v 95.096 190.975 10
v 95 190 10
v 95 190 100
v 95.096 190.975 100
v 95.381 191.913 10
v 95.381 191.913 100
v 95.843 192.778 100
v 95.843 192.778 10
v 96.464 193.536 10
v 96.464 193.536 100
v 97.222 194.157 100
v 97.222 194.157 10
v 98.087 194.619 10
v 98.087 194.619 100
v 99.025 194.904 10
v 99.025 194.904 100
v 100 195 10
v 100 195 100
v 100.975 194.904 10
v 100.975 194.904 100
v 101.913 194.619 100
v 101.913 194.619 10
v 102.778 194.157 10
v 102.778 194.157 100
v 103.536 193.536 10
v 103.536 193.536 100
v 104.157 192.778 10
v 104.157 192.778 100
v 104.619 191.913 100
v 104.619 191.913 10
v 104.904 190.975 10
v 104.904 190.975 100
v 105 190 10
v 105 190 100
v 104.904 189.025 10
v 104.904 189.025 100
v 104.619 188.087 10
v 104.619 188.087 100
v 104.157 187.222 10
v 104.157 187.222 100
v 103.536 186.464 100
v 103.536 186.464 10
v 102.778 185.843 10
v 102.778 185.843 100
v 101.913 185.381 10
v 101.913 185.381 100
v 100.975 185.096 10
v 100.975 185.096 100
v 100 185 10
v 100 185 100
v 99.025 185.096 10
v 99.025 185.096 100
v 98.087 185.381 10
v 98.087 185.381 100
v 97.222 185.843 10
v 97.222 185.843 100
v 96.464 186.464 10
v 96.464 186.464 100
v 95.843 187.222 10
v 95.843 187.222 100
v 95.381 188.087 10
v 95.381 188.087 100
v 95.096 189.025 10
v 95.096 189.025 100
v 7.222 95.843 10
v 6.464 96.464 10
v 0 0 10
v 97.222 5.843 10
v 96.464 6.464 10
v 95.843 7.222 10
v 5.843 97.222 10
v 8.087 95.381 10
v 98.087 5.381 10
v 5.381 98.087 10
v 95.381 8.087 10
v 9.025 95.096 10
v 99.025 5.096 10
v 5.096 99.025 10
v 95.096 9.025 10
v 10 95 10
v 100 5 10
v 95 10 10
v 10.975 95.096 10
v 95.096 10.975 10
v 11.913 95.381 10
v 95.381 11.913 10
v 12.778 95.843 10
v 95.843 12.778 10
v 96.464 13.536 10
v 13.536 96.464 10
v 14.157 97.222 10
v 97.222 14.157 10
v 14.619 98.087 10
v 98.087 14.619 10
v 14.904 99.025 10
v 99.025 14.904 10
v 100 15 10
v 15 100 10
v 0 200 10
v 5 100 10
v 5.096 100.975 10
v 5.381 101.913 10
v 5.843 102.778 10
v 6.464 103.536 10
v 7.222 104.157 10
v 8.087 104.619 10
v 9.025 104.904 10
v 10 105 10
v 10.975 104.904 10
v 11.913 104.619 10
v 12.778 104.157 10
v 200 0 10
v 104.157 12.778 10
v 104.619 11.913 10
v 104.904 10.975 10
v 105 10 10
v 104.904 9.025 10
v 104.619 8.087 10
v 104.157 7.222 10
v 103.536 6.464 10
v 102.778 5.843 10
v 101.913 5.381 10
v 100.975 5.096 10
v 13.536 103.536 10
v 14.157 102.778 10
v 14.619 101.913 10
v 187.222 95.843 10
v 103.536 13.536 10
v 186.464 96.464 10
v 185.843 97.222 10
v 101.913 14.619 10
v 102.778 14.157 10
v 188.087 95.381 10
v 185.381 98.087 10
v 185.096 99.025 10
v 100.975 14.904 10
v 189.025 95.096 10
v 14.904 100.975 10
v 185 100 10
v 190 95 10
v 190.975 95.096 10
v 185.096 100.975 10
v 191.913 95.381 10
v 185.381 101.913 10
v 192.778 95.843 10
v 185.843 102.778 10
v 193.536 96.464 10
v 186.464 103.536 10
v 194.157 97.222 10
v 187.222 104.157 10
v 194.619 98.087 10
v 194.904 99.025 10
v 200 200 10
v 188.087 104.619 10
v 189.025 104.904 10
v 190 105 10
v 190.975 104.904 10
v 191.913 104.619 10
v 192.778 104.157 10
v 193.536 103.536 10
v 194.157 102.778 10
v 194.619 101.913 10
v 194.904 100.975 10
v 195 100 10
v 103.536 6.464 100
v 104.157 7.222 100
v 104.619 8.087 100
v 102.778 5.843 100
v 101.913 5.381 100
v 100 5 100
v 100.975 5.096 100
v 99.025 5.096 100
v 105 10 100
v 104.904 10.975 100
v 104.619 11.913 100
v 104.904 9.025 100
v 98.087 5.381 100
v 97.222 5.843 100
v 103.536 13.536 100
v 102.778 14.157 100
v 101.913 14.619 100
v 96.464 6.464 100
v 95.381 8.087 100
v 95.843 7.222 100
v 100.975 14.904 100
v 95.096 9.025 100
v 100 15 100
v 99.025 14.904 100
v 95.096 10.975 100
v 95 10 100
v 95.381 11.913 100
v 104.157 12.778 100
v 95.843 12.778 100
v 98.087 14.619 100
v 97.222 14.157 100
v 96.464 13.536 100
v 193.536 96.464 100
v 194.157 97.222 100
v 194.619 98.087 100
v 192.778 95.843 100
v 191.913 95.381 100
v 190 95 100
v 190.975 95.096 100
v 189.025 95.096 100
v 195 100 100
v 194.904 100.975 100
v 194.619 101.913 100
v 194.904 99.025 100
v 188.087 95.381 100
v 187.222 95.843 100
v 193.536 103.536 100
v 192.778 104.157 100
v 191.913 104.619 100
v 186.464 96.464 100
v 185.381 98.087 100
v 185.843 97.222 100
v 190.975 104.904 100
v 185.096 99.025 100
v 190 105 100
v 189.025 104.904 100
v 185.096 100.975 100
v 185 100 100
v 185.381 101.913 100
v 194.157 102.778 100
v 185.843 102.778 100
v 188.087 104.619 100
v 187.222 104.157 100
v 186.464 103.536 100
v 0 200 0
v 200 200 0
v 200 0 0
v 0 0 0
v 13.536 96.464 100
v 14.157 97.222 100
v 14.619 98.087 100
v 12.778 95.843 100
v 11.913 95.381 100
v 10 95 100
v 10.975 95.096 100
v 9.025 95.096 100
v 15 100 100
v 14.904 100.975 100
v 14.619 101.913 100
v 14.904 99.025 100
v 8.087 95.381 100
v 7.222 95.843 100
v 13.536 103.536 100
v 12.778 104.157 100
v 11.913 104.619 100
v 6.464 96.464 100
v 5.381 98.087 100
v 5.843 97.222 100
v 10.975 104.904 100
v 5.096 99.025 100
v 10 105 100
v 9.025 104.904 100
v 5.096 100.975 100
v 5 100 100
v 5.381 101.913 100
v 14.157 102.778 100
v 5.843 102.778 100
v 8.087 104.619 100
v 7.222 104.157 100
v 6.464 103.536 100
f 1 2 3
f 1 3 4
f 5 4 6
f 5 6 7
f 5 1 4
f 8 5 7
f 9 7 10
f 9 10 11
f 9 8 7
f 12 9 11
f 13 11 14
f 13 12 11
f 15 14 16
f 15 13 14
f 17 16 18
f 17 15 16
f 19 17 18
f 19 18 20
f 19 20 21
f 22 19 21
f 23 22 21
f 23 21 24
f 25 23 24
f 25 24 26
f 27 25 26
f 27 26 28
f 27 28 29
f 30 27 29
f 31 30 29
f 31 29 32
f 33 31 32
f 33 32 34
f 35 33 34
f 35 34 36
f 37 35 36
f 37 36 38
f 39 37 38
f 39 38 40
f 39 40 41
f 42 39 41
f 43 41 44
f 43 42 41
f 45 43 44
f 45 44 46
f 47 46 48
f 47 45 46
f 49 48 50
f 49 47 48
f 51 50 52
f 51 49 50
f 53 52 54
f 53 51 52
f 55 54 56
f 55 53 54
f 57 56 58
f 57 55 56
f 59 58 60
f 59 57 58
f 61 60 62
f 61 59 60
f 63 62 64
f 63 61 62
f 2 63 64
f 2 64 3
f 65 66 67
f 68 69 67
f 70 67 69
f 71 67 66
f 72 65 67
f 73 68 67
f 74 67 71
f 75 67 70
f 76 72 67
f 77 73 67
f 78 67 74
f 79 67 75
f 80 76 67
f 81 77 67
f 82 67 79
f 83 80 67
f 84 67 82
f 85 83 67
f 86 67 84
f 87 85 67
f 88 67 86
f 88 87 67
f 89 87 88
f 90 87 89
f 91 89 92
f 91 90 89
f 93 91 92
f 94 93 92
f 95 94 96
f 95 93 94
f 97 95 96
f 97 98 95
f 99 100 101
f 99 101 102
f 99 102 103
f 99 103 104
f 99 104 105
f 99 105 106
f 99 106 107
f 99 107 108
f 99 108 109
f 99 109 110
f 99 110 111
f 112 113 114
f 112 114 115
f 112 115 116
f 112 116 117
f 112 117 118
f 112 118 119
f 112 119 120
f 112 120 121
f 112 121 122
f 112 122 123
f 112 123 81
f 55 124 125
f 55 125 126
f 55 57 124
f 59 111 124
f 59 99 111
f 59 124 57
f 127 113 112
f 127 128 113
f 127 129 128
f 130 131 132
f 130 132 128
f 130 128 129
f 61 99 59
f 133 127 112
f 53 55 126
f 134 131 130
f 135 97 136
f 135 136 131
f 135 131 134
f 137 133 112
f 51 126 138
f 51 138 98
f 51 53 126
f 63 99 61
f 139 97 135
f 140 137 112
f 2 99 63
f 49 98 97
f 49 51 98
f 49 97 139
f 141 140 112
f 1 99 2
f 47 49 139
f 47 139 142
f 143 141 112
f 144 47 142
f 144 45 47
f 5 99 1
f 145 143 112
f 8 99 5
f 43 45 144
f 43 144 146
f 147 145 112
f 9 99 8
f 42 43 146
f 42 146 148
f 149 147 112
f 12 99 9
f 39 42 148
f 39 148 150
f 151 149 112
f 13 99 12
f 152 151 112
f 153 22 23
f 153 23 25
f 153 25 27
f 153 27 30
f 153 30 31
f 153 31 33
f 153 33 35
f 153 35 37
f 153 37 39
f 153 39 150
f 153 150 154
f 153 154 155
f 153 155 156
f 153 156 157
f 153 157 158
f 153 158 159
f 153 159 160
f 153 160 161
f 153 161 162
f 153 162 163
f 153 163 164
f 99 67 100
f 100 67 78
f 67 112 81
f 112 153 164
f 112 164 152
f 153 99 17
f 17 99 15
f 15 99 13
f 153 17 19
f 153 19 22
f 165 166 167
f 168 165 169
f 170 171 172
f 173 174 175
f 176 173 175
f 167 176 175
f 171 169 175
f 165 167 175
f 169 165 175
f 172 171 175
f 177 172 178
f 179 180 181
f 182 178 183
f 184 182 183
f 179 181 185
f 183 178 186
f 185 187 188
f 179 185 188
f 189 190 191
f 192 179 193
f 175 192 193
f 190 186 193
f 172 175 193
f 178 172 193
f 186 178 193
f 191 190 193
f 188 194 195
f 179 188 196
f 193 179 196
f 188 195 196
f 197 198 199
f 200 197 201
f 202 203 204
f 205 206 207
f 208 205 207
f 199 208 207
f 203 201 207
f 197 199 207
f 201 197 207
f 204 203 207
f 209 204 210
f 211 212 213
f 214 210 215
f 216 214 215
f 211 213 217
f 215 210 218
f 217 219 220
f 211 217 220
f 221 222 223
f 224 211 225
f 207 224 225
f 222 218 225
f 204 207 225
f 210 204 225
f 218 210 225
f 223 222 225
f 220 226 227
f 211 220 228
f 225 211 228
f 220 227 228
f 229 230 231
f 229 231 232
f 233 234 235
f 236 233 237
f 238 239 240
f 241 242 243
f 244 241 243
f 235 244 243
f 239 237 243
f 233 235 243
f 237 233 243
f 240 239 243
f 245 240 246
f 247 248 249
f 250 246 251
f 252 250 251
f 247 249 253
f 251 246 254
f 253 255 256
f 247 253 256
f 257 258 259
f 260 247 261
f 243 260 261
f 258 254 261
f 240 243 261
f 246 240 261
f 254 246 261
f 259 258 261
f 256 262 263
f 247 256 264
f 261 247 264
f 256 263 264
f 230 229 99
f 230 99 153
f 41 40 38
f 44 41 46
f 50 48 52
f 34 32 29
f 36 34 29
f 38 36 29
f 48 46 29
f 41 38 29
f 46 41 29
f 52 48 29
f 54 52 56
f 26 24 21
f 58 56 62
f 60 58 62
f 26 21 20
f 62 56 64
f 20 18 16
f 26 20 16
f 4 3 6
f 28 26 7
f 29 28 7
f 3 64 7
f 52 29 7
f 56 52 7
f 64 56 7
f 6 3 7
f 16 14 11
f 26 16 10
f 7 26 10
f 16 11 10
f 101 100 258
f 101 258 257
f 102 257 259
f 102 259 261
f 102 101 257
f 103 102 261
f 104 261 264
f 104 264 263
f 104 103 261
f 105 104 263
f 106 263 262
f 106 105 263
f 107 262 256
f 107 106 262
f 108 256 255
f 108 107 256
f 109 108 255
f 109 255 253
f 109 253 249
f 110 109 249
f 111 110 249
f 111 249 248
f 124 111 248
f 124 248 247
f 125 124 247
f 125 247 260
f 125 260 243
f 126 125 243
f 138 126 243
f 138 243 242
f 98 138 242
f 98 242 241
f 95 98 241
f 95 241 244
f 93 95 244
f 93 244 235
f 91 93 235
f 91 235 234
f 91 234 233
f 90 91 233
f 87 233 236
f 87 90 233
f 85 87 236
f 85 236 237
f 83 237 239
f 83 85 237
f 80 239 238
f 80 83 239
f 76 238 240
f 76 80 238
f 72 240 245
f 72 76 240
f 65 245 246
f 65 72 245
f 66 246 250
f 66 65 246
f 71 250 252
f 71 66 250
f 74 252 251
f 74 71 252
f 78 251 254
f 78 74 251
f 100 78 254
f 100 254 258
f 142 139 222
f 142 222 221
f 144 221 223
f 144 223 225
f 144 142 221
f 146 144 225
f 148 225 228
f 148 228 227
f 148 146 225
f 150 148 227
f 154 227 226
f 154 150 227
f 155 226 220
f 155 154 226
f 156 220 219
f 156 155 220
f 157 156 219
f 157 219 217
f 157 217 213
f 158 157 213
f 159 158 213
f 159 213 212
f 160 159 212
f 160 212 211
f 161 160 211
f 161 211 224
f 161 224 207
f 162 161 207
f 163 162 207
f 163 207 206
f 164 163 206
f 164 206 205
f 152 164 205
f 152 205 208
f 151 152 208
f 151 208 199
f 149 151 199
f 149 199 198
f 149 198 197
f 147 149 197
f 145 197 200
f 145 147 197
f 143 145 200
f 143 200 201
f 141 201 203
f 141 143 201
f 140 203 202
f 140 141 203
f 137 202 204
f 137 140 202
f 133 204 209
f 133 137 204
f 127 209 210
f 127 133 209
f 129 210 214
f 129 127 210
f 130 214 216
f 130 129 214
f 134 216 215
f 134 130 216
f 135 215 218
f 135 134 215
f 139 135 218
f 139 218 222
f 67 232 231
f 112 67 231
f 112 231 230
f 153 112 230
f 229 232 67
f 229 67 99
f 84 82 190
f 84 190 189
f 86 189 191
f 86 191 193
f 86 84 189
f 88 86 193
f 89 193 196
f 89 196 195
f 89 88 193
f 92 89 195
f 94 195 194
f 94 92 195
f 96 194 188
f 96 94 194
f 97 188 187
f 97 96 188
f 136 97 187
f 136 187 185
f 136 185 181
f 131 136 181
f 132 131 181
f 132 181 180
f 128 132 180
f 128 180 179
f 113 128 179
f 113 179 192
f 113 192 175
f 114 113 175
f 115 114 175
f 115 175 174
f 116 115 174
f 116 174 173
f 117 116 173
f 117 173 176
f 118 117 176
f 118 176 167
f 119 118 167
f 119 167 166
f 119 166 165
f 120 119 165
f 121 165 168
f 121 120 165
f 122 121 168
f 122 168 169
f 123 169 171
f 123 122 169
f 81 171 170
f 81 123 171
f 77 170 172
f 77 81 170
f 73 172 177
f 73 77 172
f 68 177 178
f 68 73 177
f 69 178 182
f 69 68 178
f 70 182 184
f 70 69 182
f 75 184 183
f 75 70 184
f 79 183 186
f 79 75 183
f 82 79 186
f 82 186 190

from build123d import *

# Parameters (mm, degrees)
SKETCH1_W           = 200
SKETCH1_H           = 200
BOSS_EXTRUDE1_DEPTH = 10
SKETCH4_R           = 5
BOSS_EXTRUDE2_DEPTH = 100


with BuildPart() as part:
    # Sketch1 → Boss-Extrude1 (new body)
    with BuildSketch(Plane.XY):
        with Locations((100, 100)):
            Rectangle(SKETCH1_W, SKETCH1_H)
    extrude(amount=BOSS_EXTRUDE1_DEPTH)

    # Sketch4 → Boss-Extrude2 (add)
    with BuildSketch(Plane(origin=(0, 0, 0), x_dir=(-1, 0, 0), z_dir=(0, 0, -1))):
        with Locations((-190, 100)):
            Circle(SKETCH4_R)
        with Locations((-100, 10)):
            Circle(SKETCH4_R)
        with Locations((-100, 190)):
            Circle(SKETCH4_R)
        with Locations((-10, 100)):
            Circle(SKETCH4_R)
    extrude(amount=-BOSS_EXTRUDE2_DEPTH)


solid = part.part
